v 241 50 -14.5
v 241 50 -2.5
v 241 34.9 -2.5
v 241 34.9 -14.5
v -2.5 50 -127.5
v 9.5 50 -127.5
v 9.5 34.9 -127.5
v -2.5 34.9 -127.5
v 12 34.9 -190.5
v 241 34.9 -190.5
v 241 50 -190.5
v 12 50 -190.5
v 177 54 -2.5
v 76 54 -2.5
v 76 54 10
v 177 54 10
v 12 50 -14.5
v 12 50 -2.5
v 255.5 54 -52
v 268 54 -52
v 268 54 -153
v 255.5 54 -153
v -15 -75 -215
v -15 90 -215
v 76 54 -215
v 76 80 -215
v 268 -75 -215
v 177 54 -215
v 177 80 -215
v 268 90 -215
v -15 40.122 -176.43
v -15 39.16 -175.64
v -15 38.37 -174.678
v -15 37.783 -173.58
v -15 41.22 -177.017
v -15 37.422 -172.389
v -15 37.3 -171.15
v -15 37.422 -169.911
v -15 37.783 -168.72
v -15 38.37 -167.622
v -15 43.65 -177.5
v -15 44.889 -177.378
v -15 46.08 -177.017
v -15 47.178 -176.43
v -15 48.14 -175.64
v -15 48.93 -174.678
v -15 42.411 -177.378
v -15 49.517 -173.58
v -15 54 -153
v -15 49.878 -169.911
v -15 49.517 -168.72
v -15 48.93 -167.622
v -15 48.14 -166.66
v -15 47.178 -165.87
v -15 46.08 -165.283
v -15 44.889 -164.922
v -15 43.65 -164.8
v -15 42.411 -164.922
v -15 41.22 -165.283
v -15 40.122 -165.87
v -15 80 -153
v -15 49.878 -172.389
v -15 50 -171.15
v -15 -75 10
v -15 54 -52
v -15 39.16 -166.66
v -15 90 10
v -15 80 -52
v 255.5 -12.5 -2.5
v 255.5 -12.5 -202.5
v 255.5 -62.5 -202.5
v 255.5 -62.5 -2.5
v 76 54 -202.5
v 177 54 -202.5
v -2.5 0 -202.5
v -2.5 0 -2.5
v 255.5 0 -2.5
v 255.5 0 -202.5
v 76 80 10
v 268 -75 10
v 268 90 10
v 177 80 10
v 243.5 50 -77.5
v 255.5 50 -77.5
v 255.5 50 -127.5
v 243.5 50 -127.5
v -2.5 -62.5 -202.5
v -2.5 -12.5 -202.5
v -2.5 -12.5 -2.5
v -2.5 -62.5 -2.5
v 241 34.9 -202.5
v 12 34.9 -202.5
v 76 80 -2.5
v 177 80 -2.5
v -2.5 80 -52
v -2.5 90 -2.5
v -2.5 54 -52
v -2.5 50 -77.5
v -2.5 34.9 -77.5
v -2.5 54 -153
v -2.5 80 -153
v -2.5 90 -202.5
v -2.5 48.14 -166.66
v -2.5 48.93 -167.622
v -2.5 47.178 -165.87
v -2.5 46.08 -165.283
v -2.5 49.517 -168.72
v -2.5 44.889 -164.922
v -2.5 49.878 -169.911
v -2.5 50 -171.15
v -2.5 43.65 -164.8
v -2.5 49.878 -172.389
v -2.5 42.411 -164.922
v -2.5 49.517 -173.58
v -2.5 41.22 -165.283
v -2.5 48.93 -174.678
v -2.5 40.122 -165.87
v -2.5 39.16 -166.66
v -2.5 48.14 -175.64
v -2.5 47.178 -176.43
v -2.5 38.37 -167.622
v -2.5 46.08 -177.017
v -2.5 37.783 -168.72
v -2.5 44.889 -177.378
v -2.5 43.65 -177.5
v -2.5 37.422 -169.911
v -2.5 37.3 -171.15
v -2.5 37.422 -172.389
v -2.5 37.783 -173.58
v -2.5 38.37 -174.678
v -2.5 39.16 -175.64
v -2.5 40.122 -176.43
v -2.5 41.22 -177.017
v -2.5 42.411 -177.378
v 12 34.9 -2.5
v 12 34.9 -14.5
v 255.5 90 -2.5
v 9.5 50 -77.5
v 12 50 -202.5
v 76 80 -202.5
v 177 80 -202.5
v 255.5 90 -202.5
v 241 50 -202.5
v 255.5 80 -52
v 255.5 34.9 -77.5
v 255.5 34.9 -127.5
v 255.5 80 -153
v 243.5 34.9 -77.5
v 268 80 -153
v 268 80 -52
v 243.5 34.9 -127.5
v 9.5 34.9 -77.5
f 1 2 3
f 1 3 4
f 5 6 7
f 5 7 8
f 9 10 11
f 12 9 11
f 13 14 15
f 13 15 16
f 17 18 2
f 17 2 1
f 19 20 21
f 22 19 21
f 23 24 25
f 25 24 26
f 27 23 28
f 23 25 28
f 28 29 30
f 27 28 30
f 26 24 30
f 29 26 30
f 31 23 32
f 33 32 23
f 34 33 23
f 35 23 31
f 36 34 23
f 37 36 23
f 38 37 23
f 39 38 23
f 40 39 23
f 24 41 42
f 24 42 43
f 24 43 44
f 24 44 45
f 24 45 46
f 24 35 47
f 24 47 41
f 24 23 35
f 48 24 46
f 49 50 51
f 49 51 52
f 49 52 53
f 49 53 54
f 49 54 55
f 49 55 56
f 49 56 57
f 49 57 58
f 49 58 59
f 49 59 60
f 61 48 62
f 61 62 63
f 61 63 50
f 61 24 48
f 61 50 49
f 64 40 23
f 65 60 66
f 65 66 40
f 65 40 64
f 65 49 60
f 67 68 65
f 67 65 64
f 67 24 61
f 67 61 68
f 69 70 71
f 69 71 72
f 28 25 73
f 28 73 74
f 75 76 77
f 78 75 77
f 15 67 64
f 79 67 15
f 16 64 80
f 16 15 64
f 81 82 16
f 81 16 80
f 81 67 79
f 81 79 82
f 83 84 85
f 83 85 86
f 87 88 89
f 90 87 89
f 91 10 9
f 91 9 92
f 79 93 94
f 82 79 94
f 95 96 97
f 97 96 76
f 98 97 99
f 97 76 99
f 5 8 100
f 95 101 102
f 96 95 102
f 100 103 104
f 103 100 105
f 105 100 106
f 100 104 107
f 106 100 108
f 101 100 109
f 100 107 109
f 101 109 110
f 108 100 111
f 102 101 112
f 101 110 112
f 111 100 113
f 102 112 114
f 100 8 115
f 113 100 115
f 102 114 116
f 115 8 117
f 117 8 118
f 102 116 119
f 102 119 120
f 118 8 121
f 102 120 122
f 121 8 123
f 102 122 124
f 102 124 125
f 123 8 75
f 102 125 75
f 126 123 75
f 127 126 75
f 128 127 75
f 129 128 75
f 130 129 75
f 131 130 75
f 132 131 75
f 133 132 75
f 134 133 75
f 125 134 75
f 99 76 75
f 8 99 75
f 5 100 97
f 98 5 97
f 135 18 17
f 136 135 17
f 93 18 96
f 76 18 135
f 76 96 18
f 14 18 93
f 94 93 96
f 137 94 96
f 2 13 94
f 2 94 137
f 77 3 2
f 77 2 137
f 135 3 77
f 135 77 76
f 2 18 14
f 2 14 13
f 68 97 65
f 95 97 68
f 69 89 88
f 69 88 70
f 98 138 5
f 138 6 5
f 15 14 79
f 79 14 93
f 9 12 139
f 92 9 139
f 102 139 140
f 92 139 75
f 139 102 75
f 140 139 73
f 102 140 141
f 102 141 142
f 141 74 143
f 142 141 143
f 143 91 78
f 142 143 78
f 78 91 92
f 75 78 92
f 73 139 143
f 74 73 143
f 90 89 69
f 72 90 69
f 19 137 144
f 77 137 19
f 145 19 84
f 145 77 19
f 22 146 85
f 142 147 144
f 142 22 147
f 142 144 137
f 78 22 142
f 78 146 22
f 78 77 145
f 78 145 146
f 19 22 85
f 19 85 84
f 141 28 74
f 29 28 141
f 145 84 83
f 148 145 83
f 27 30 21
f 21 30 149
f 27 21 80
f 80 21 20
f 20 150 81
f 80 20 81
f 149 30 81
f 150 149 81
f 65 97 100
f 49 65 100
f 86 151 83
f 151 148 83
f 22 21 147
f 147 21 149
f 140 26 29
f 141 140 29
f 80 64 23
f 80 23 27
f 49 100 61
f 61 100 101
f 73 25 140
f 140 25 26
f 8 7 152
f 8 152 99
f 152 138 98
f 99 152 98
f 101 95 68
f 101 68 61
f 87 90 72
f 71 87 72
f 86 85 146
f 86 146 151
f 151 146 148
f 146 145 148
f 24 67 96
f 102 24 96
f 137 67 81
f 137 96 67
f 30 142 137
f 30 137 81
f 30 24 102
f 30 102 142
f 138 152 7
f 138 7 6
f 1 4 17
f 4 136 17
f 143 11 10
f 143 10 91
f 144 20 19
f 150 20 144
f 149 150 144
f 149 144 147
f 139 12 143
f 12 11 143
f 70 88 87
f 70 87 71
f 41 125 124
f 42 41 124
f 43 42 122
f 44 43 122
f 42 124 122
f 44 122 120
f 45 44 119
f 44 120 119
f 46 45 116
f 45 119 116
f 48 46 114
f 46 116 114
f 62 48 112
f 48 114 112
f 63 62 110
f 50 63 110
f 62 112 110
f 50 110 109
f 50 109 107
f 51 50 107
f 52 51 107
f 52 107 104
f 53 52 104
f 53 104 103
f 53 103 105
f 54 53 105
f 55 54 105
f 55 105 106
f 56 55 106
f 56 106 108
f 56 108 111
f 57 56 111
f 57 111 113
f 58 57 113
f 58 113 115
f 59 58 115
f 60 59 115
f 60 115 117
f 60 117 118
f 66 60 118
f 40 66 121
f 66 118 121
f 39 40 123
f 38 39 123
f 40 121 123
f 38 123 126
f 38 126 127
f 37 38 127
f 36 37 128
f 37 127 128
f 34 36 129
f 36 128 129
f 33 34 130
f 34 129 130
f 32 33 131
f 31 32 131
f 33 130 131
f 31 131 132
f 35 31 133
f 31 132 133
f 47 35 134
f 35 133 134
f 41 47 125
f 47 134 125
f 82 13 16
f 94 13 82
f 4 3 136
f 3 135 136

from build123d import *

# Parameters (mm, degrees)
SKETCH1_W                         = 283
SKETCH1_H                         = 225
SKETCH1_W_2                       = 258
SKETCH1_H_2                       = 200
WALLS_DEPTH                       = 90
SKETCH3_W                         = 283
SKETCH3_H                         = 225
BASE_DEPTH                        = 12.5
SKETCH4_W                         = 12
SKETCH4_H                         = 15.1
LONG_SUPPORT_DEPTH                = 114.5
SKETCH5_W                         = 12
SKETCH5_H                         = 15.1
SHORT_SUPPORT_DEPTH               = 25
RESERVOIR_OUTFLOW_TUBE_HOLE_REACH = 359.065
SKETCH6_R                         = 6.35
SKETCH7_W                         = 101
SKETCH7_H                         = 26
CONNECTOR_PORT_SHORTSIDE_DEPTH    = 283
LPATTERN1_COUNT                   = 2
LPATTERN1_PITCH                   = 270.5
SKETCH8_W                         = 101
SKETCH8_H                         = 26
CONNECTOR_PORT_LONGSIDE_DEPTH     = 225
LPATTERN2_COUNT                   = 2
LPATTERN2_PITCH                   = 212.5
SKETCH9_W                         = 283
SKETCH9_H                         = 225
SKETCH9_W_2                       = 258
SKETCH9_H_2                       = 200
LOWER_WATER_JACKET_WALLS_DEPTH    = 50
SKETCH11_W                        = 283
SKETCH11_H                        = 225
LOWER_WATER_JACKET_BOTTOM_DEPTH   = 12.5


with BuildPart() as part:
    # Sketch1 → Walls (new body)
    with BuildSketch(Plane(origin=(0, 0, 0), x_dir=(1, 0, 0), z_dir=(0, 1, 0))):
        with Locations((126.5, 102.5)):
            Rectangle(SKETCH1_W, SKETCH1_H)
        with Locations((126.5, 102.5)):
            Rectangle(SKETCH1_W_2, SKETCH1_H_2, mode=Mode.SUBTRACT)
    extrude(amount=WALLS_DEPTH)

    # Sketch3 → Base (add)
    with BuildSketch(Plane.XZ):
        with Locations((126.5, -102.5)):
            Rectangle(SKETCH3_W, SKETCH3_H)
    extrude(amount=BASE_DEPTH)

    # Sketch4 → Long_Support (add, symmetric)
    with BuildSketch(Plane(origin=(126.5, 0, 0), x_dir=(0, 0, -1), z_dir=(1, 0, 0))):
        with Locations((8.5, 42.45)):
            Rectangle(SKETCH4_W, SKETCH4_H)
        with Locations((196.5, 42.45)):
            Rectangle(SKETCH4_W, SKETCH4_H)
    extrude(amount=LONG_SUPPORT_DEPTH, both=True)

    # Sketch5 → Short_Support (add, symmetric)
    with BuildSketch(Plane(origin=(0, 0, -102.5), x_dir=(-1, 0, 0), z_dir=(0, 0, -1))):
        with Locations((-249.5, 42.45)):
            Rectangle(SKETCH5_W, SKETCH5_H)
        with Locations((-3.5, 42.45)):
            Rectangle(SKETCH5_W, SKETCH5_H)
    extrude(amount=SHORT_SUPPORT_DEPTH, both=True)

    # Sketch6 → Reservoir_Outflow_Tube_Hole (cut, up to next)
    with BuildSketch(Plane(origin=(-2.5, 0, 0), x_dir=(0, 0, -1), z_dir=(1, 0, 0)), mode=Mode.PRIVATE) as reservoir_outflow_tube_hole_sk1:
        with Locations((171.15, 43.65)):
            Circle(SKETCH6_R)
    reservoir_outflow_tube_hole_tool1 = extrude(reservoir_outflow_tube_hole_sk1.sketch, amount=-RESERVOIR_OUTFLOW_TUBE_HOLE_REACH, mode=Mode.PRIVATE) & part.part
    add(reservoir_outflow_tube_hole_tool1.solids().sort_by_distance((-2.5, 43.65, -171.15))[0], mode=Mode.SUBTRACT)

    # Sketch7 → Connector_Port_ShortSide (cut)
    with BuildSketch(Plane(origin=(-2.5, 0, 0), x_dir=(0, 0, -1), z_dir=(1, 0, 0))):
        with Locations((102.5, 67)):
            Rectangle(SKETCH7_W, SKETCH7_H)
    connector_port_shortside = extrude(amount=-CONNECTOR_PORT_SHORTSIDE_DEPTH, mode=Mode.SUBTRACT)

    # LPattern1: Connector_Port_ShortSide ×2
    with Locations(*[(i * LPATTERN1_PITCH, 0, 0) for i in range(1, LPATTERN1_COUNT)]):
        add(connector_port_shortside, mode=Mode.SUBTRACT)

    # Sketch8 → Connector_Port_LongSide (cut)
    with BuildSketch(Plane.XY.offset(-2.5)):
        with Locations((126.5, 67)):
            Rectangle(SKETCH8_W, SKETCH8_H)
    connector_port_longside = extrude(amount=CONNECTOR_PORT_LONGSIDE_DEPTH, mode=Mode.SUBTRACT)

    # LPattern2: Connector_Port_LongSide ×2
    with Locations(*[(0, 0, -i * LPATTERN2_PITCH) for i in range(1, LPATTERN2_COUNT)]):
        add(connector_port_longside, mode=Mode.SUBTRACT)

    # Sketch9 → Lower_Water_Jacket_Walls (add)
    with BuildSketch(Plane.XZ.offset(12.5)):
        with Locations((126.5, -102.5)):
            Rectangle(SKETCH9_W, SKETCH9_H)
        with Locations((126.5, -102.5)):
            Rectangle(SKETCH9_W_2, SKETCH9_H_2, mode=Mode.SUBTRACT)
    extrude(amount=LOWER_WATER_JACKET_WALLS_DEPTH)

    # Sketch11 → Lower_Water_Jacket_Bottom (add)
    with BuildSketch(Plane.XZ.offset(62.5)):
        with Locations((126.5, -102.5)):
            Rectangle(SKETCH11_W, SKETCH11_H)
    extrude(amount=LOWER_WATER_JACKET_BOTTOM_DEPTH)


solid = part.part
